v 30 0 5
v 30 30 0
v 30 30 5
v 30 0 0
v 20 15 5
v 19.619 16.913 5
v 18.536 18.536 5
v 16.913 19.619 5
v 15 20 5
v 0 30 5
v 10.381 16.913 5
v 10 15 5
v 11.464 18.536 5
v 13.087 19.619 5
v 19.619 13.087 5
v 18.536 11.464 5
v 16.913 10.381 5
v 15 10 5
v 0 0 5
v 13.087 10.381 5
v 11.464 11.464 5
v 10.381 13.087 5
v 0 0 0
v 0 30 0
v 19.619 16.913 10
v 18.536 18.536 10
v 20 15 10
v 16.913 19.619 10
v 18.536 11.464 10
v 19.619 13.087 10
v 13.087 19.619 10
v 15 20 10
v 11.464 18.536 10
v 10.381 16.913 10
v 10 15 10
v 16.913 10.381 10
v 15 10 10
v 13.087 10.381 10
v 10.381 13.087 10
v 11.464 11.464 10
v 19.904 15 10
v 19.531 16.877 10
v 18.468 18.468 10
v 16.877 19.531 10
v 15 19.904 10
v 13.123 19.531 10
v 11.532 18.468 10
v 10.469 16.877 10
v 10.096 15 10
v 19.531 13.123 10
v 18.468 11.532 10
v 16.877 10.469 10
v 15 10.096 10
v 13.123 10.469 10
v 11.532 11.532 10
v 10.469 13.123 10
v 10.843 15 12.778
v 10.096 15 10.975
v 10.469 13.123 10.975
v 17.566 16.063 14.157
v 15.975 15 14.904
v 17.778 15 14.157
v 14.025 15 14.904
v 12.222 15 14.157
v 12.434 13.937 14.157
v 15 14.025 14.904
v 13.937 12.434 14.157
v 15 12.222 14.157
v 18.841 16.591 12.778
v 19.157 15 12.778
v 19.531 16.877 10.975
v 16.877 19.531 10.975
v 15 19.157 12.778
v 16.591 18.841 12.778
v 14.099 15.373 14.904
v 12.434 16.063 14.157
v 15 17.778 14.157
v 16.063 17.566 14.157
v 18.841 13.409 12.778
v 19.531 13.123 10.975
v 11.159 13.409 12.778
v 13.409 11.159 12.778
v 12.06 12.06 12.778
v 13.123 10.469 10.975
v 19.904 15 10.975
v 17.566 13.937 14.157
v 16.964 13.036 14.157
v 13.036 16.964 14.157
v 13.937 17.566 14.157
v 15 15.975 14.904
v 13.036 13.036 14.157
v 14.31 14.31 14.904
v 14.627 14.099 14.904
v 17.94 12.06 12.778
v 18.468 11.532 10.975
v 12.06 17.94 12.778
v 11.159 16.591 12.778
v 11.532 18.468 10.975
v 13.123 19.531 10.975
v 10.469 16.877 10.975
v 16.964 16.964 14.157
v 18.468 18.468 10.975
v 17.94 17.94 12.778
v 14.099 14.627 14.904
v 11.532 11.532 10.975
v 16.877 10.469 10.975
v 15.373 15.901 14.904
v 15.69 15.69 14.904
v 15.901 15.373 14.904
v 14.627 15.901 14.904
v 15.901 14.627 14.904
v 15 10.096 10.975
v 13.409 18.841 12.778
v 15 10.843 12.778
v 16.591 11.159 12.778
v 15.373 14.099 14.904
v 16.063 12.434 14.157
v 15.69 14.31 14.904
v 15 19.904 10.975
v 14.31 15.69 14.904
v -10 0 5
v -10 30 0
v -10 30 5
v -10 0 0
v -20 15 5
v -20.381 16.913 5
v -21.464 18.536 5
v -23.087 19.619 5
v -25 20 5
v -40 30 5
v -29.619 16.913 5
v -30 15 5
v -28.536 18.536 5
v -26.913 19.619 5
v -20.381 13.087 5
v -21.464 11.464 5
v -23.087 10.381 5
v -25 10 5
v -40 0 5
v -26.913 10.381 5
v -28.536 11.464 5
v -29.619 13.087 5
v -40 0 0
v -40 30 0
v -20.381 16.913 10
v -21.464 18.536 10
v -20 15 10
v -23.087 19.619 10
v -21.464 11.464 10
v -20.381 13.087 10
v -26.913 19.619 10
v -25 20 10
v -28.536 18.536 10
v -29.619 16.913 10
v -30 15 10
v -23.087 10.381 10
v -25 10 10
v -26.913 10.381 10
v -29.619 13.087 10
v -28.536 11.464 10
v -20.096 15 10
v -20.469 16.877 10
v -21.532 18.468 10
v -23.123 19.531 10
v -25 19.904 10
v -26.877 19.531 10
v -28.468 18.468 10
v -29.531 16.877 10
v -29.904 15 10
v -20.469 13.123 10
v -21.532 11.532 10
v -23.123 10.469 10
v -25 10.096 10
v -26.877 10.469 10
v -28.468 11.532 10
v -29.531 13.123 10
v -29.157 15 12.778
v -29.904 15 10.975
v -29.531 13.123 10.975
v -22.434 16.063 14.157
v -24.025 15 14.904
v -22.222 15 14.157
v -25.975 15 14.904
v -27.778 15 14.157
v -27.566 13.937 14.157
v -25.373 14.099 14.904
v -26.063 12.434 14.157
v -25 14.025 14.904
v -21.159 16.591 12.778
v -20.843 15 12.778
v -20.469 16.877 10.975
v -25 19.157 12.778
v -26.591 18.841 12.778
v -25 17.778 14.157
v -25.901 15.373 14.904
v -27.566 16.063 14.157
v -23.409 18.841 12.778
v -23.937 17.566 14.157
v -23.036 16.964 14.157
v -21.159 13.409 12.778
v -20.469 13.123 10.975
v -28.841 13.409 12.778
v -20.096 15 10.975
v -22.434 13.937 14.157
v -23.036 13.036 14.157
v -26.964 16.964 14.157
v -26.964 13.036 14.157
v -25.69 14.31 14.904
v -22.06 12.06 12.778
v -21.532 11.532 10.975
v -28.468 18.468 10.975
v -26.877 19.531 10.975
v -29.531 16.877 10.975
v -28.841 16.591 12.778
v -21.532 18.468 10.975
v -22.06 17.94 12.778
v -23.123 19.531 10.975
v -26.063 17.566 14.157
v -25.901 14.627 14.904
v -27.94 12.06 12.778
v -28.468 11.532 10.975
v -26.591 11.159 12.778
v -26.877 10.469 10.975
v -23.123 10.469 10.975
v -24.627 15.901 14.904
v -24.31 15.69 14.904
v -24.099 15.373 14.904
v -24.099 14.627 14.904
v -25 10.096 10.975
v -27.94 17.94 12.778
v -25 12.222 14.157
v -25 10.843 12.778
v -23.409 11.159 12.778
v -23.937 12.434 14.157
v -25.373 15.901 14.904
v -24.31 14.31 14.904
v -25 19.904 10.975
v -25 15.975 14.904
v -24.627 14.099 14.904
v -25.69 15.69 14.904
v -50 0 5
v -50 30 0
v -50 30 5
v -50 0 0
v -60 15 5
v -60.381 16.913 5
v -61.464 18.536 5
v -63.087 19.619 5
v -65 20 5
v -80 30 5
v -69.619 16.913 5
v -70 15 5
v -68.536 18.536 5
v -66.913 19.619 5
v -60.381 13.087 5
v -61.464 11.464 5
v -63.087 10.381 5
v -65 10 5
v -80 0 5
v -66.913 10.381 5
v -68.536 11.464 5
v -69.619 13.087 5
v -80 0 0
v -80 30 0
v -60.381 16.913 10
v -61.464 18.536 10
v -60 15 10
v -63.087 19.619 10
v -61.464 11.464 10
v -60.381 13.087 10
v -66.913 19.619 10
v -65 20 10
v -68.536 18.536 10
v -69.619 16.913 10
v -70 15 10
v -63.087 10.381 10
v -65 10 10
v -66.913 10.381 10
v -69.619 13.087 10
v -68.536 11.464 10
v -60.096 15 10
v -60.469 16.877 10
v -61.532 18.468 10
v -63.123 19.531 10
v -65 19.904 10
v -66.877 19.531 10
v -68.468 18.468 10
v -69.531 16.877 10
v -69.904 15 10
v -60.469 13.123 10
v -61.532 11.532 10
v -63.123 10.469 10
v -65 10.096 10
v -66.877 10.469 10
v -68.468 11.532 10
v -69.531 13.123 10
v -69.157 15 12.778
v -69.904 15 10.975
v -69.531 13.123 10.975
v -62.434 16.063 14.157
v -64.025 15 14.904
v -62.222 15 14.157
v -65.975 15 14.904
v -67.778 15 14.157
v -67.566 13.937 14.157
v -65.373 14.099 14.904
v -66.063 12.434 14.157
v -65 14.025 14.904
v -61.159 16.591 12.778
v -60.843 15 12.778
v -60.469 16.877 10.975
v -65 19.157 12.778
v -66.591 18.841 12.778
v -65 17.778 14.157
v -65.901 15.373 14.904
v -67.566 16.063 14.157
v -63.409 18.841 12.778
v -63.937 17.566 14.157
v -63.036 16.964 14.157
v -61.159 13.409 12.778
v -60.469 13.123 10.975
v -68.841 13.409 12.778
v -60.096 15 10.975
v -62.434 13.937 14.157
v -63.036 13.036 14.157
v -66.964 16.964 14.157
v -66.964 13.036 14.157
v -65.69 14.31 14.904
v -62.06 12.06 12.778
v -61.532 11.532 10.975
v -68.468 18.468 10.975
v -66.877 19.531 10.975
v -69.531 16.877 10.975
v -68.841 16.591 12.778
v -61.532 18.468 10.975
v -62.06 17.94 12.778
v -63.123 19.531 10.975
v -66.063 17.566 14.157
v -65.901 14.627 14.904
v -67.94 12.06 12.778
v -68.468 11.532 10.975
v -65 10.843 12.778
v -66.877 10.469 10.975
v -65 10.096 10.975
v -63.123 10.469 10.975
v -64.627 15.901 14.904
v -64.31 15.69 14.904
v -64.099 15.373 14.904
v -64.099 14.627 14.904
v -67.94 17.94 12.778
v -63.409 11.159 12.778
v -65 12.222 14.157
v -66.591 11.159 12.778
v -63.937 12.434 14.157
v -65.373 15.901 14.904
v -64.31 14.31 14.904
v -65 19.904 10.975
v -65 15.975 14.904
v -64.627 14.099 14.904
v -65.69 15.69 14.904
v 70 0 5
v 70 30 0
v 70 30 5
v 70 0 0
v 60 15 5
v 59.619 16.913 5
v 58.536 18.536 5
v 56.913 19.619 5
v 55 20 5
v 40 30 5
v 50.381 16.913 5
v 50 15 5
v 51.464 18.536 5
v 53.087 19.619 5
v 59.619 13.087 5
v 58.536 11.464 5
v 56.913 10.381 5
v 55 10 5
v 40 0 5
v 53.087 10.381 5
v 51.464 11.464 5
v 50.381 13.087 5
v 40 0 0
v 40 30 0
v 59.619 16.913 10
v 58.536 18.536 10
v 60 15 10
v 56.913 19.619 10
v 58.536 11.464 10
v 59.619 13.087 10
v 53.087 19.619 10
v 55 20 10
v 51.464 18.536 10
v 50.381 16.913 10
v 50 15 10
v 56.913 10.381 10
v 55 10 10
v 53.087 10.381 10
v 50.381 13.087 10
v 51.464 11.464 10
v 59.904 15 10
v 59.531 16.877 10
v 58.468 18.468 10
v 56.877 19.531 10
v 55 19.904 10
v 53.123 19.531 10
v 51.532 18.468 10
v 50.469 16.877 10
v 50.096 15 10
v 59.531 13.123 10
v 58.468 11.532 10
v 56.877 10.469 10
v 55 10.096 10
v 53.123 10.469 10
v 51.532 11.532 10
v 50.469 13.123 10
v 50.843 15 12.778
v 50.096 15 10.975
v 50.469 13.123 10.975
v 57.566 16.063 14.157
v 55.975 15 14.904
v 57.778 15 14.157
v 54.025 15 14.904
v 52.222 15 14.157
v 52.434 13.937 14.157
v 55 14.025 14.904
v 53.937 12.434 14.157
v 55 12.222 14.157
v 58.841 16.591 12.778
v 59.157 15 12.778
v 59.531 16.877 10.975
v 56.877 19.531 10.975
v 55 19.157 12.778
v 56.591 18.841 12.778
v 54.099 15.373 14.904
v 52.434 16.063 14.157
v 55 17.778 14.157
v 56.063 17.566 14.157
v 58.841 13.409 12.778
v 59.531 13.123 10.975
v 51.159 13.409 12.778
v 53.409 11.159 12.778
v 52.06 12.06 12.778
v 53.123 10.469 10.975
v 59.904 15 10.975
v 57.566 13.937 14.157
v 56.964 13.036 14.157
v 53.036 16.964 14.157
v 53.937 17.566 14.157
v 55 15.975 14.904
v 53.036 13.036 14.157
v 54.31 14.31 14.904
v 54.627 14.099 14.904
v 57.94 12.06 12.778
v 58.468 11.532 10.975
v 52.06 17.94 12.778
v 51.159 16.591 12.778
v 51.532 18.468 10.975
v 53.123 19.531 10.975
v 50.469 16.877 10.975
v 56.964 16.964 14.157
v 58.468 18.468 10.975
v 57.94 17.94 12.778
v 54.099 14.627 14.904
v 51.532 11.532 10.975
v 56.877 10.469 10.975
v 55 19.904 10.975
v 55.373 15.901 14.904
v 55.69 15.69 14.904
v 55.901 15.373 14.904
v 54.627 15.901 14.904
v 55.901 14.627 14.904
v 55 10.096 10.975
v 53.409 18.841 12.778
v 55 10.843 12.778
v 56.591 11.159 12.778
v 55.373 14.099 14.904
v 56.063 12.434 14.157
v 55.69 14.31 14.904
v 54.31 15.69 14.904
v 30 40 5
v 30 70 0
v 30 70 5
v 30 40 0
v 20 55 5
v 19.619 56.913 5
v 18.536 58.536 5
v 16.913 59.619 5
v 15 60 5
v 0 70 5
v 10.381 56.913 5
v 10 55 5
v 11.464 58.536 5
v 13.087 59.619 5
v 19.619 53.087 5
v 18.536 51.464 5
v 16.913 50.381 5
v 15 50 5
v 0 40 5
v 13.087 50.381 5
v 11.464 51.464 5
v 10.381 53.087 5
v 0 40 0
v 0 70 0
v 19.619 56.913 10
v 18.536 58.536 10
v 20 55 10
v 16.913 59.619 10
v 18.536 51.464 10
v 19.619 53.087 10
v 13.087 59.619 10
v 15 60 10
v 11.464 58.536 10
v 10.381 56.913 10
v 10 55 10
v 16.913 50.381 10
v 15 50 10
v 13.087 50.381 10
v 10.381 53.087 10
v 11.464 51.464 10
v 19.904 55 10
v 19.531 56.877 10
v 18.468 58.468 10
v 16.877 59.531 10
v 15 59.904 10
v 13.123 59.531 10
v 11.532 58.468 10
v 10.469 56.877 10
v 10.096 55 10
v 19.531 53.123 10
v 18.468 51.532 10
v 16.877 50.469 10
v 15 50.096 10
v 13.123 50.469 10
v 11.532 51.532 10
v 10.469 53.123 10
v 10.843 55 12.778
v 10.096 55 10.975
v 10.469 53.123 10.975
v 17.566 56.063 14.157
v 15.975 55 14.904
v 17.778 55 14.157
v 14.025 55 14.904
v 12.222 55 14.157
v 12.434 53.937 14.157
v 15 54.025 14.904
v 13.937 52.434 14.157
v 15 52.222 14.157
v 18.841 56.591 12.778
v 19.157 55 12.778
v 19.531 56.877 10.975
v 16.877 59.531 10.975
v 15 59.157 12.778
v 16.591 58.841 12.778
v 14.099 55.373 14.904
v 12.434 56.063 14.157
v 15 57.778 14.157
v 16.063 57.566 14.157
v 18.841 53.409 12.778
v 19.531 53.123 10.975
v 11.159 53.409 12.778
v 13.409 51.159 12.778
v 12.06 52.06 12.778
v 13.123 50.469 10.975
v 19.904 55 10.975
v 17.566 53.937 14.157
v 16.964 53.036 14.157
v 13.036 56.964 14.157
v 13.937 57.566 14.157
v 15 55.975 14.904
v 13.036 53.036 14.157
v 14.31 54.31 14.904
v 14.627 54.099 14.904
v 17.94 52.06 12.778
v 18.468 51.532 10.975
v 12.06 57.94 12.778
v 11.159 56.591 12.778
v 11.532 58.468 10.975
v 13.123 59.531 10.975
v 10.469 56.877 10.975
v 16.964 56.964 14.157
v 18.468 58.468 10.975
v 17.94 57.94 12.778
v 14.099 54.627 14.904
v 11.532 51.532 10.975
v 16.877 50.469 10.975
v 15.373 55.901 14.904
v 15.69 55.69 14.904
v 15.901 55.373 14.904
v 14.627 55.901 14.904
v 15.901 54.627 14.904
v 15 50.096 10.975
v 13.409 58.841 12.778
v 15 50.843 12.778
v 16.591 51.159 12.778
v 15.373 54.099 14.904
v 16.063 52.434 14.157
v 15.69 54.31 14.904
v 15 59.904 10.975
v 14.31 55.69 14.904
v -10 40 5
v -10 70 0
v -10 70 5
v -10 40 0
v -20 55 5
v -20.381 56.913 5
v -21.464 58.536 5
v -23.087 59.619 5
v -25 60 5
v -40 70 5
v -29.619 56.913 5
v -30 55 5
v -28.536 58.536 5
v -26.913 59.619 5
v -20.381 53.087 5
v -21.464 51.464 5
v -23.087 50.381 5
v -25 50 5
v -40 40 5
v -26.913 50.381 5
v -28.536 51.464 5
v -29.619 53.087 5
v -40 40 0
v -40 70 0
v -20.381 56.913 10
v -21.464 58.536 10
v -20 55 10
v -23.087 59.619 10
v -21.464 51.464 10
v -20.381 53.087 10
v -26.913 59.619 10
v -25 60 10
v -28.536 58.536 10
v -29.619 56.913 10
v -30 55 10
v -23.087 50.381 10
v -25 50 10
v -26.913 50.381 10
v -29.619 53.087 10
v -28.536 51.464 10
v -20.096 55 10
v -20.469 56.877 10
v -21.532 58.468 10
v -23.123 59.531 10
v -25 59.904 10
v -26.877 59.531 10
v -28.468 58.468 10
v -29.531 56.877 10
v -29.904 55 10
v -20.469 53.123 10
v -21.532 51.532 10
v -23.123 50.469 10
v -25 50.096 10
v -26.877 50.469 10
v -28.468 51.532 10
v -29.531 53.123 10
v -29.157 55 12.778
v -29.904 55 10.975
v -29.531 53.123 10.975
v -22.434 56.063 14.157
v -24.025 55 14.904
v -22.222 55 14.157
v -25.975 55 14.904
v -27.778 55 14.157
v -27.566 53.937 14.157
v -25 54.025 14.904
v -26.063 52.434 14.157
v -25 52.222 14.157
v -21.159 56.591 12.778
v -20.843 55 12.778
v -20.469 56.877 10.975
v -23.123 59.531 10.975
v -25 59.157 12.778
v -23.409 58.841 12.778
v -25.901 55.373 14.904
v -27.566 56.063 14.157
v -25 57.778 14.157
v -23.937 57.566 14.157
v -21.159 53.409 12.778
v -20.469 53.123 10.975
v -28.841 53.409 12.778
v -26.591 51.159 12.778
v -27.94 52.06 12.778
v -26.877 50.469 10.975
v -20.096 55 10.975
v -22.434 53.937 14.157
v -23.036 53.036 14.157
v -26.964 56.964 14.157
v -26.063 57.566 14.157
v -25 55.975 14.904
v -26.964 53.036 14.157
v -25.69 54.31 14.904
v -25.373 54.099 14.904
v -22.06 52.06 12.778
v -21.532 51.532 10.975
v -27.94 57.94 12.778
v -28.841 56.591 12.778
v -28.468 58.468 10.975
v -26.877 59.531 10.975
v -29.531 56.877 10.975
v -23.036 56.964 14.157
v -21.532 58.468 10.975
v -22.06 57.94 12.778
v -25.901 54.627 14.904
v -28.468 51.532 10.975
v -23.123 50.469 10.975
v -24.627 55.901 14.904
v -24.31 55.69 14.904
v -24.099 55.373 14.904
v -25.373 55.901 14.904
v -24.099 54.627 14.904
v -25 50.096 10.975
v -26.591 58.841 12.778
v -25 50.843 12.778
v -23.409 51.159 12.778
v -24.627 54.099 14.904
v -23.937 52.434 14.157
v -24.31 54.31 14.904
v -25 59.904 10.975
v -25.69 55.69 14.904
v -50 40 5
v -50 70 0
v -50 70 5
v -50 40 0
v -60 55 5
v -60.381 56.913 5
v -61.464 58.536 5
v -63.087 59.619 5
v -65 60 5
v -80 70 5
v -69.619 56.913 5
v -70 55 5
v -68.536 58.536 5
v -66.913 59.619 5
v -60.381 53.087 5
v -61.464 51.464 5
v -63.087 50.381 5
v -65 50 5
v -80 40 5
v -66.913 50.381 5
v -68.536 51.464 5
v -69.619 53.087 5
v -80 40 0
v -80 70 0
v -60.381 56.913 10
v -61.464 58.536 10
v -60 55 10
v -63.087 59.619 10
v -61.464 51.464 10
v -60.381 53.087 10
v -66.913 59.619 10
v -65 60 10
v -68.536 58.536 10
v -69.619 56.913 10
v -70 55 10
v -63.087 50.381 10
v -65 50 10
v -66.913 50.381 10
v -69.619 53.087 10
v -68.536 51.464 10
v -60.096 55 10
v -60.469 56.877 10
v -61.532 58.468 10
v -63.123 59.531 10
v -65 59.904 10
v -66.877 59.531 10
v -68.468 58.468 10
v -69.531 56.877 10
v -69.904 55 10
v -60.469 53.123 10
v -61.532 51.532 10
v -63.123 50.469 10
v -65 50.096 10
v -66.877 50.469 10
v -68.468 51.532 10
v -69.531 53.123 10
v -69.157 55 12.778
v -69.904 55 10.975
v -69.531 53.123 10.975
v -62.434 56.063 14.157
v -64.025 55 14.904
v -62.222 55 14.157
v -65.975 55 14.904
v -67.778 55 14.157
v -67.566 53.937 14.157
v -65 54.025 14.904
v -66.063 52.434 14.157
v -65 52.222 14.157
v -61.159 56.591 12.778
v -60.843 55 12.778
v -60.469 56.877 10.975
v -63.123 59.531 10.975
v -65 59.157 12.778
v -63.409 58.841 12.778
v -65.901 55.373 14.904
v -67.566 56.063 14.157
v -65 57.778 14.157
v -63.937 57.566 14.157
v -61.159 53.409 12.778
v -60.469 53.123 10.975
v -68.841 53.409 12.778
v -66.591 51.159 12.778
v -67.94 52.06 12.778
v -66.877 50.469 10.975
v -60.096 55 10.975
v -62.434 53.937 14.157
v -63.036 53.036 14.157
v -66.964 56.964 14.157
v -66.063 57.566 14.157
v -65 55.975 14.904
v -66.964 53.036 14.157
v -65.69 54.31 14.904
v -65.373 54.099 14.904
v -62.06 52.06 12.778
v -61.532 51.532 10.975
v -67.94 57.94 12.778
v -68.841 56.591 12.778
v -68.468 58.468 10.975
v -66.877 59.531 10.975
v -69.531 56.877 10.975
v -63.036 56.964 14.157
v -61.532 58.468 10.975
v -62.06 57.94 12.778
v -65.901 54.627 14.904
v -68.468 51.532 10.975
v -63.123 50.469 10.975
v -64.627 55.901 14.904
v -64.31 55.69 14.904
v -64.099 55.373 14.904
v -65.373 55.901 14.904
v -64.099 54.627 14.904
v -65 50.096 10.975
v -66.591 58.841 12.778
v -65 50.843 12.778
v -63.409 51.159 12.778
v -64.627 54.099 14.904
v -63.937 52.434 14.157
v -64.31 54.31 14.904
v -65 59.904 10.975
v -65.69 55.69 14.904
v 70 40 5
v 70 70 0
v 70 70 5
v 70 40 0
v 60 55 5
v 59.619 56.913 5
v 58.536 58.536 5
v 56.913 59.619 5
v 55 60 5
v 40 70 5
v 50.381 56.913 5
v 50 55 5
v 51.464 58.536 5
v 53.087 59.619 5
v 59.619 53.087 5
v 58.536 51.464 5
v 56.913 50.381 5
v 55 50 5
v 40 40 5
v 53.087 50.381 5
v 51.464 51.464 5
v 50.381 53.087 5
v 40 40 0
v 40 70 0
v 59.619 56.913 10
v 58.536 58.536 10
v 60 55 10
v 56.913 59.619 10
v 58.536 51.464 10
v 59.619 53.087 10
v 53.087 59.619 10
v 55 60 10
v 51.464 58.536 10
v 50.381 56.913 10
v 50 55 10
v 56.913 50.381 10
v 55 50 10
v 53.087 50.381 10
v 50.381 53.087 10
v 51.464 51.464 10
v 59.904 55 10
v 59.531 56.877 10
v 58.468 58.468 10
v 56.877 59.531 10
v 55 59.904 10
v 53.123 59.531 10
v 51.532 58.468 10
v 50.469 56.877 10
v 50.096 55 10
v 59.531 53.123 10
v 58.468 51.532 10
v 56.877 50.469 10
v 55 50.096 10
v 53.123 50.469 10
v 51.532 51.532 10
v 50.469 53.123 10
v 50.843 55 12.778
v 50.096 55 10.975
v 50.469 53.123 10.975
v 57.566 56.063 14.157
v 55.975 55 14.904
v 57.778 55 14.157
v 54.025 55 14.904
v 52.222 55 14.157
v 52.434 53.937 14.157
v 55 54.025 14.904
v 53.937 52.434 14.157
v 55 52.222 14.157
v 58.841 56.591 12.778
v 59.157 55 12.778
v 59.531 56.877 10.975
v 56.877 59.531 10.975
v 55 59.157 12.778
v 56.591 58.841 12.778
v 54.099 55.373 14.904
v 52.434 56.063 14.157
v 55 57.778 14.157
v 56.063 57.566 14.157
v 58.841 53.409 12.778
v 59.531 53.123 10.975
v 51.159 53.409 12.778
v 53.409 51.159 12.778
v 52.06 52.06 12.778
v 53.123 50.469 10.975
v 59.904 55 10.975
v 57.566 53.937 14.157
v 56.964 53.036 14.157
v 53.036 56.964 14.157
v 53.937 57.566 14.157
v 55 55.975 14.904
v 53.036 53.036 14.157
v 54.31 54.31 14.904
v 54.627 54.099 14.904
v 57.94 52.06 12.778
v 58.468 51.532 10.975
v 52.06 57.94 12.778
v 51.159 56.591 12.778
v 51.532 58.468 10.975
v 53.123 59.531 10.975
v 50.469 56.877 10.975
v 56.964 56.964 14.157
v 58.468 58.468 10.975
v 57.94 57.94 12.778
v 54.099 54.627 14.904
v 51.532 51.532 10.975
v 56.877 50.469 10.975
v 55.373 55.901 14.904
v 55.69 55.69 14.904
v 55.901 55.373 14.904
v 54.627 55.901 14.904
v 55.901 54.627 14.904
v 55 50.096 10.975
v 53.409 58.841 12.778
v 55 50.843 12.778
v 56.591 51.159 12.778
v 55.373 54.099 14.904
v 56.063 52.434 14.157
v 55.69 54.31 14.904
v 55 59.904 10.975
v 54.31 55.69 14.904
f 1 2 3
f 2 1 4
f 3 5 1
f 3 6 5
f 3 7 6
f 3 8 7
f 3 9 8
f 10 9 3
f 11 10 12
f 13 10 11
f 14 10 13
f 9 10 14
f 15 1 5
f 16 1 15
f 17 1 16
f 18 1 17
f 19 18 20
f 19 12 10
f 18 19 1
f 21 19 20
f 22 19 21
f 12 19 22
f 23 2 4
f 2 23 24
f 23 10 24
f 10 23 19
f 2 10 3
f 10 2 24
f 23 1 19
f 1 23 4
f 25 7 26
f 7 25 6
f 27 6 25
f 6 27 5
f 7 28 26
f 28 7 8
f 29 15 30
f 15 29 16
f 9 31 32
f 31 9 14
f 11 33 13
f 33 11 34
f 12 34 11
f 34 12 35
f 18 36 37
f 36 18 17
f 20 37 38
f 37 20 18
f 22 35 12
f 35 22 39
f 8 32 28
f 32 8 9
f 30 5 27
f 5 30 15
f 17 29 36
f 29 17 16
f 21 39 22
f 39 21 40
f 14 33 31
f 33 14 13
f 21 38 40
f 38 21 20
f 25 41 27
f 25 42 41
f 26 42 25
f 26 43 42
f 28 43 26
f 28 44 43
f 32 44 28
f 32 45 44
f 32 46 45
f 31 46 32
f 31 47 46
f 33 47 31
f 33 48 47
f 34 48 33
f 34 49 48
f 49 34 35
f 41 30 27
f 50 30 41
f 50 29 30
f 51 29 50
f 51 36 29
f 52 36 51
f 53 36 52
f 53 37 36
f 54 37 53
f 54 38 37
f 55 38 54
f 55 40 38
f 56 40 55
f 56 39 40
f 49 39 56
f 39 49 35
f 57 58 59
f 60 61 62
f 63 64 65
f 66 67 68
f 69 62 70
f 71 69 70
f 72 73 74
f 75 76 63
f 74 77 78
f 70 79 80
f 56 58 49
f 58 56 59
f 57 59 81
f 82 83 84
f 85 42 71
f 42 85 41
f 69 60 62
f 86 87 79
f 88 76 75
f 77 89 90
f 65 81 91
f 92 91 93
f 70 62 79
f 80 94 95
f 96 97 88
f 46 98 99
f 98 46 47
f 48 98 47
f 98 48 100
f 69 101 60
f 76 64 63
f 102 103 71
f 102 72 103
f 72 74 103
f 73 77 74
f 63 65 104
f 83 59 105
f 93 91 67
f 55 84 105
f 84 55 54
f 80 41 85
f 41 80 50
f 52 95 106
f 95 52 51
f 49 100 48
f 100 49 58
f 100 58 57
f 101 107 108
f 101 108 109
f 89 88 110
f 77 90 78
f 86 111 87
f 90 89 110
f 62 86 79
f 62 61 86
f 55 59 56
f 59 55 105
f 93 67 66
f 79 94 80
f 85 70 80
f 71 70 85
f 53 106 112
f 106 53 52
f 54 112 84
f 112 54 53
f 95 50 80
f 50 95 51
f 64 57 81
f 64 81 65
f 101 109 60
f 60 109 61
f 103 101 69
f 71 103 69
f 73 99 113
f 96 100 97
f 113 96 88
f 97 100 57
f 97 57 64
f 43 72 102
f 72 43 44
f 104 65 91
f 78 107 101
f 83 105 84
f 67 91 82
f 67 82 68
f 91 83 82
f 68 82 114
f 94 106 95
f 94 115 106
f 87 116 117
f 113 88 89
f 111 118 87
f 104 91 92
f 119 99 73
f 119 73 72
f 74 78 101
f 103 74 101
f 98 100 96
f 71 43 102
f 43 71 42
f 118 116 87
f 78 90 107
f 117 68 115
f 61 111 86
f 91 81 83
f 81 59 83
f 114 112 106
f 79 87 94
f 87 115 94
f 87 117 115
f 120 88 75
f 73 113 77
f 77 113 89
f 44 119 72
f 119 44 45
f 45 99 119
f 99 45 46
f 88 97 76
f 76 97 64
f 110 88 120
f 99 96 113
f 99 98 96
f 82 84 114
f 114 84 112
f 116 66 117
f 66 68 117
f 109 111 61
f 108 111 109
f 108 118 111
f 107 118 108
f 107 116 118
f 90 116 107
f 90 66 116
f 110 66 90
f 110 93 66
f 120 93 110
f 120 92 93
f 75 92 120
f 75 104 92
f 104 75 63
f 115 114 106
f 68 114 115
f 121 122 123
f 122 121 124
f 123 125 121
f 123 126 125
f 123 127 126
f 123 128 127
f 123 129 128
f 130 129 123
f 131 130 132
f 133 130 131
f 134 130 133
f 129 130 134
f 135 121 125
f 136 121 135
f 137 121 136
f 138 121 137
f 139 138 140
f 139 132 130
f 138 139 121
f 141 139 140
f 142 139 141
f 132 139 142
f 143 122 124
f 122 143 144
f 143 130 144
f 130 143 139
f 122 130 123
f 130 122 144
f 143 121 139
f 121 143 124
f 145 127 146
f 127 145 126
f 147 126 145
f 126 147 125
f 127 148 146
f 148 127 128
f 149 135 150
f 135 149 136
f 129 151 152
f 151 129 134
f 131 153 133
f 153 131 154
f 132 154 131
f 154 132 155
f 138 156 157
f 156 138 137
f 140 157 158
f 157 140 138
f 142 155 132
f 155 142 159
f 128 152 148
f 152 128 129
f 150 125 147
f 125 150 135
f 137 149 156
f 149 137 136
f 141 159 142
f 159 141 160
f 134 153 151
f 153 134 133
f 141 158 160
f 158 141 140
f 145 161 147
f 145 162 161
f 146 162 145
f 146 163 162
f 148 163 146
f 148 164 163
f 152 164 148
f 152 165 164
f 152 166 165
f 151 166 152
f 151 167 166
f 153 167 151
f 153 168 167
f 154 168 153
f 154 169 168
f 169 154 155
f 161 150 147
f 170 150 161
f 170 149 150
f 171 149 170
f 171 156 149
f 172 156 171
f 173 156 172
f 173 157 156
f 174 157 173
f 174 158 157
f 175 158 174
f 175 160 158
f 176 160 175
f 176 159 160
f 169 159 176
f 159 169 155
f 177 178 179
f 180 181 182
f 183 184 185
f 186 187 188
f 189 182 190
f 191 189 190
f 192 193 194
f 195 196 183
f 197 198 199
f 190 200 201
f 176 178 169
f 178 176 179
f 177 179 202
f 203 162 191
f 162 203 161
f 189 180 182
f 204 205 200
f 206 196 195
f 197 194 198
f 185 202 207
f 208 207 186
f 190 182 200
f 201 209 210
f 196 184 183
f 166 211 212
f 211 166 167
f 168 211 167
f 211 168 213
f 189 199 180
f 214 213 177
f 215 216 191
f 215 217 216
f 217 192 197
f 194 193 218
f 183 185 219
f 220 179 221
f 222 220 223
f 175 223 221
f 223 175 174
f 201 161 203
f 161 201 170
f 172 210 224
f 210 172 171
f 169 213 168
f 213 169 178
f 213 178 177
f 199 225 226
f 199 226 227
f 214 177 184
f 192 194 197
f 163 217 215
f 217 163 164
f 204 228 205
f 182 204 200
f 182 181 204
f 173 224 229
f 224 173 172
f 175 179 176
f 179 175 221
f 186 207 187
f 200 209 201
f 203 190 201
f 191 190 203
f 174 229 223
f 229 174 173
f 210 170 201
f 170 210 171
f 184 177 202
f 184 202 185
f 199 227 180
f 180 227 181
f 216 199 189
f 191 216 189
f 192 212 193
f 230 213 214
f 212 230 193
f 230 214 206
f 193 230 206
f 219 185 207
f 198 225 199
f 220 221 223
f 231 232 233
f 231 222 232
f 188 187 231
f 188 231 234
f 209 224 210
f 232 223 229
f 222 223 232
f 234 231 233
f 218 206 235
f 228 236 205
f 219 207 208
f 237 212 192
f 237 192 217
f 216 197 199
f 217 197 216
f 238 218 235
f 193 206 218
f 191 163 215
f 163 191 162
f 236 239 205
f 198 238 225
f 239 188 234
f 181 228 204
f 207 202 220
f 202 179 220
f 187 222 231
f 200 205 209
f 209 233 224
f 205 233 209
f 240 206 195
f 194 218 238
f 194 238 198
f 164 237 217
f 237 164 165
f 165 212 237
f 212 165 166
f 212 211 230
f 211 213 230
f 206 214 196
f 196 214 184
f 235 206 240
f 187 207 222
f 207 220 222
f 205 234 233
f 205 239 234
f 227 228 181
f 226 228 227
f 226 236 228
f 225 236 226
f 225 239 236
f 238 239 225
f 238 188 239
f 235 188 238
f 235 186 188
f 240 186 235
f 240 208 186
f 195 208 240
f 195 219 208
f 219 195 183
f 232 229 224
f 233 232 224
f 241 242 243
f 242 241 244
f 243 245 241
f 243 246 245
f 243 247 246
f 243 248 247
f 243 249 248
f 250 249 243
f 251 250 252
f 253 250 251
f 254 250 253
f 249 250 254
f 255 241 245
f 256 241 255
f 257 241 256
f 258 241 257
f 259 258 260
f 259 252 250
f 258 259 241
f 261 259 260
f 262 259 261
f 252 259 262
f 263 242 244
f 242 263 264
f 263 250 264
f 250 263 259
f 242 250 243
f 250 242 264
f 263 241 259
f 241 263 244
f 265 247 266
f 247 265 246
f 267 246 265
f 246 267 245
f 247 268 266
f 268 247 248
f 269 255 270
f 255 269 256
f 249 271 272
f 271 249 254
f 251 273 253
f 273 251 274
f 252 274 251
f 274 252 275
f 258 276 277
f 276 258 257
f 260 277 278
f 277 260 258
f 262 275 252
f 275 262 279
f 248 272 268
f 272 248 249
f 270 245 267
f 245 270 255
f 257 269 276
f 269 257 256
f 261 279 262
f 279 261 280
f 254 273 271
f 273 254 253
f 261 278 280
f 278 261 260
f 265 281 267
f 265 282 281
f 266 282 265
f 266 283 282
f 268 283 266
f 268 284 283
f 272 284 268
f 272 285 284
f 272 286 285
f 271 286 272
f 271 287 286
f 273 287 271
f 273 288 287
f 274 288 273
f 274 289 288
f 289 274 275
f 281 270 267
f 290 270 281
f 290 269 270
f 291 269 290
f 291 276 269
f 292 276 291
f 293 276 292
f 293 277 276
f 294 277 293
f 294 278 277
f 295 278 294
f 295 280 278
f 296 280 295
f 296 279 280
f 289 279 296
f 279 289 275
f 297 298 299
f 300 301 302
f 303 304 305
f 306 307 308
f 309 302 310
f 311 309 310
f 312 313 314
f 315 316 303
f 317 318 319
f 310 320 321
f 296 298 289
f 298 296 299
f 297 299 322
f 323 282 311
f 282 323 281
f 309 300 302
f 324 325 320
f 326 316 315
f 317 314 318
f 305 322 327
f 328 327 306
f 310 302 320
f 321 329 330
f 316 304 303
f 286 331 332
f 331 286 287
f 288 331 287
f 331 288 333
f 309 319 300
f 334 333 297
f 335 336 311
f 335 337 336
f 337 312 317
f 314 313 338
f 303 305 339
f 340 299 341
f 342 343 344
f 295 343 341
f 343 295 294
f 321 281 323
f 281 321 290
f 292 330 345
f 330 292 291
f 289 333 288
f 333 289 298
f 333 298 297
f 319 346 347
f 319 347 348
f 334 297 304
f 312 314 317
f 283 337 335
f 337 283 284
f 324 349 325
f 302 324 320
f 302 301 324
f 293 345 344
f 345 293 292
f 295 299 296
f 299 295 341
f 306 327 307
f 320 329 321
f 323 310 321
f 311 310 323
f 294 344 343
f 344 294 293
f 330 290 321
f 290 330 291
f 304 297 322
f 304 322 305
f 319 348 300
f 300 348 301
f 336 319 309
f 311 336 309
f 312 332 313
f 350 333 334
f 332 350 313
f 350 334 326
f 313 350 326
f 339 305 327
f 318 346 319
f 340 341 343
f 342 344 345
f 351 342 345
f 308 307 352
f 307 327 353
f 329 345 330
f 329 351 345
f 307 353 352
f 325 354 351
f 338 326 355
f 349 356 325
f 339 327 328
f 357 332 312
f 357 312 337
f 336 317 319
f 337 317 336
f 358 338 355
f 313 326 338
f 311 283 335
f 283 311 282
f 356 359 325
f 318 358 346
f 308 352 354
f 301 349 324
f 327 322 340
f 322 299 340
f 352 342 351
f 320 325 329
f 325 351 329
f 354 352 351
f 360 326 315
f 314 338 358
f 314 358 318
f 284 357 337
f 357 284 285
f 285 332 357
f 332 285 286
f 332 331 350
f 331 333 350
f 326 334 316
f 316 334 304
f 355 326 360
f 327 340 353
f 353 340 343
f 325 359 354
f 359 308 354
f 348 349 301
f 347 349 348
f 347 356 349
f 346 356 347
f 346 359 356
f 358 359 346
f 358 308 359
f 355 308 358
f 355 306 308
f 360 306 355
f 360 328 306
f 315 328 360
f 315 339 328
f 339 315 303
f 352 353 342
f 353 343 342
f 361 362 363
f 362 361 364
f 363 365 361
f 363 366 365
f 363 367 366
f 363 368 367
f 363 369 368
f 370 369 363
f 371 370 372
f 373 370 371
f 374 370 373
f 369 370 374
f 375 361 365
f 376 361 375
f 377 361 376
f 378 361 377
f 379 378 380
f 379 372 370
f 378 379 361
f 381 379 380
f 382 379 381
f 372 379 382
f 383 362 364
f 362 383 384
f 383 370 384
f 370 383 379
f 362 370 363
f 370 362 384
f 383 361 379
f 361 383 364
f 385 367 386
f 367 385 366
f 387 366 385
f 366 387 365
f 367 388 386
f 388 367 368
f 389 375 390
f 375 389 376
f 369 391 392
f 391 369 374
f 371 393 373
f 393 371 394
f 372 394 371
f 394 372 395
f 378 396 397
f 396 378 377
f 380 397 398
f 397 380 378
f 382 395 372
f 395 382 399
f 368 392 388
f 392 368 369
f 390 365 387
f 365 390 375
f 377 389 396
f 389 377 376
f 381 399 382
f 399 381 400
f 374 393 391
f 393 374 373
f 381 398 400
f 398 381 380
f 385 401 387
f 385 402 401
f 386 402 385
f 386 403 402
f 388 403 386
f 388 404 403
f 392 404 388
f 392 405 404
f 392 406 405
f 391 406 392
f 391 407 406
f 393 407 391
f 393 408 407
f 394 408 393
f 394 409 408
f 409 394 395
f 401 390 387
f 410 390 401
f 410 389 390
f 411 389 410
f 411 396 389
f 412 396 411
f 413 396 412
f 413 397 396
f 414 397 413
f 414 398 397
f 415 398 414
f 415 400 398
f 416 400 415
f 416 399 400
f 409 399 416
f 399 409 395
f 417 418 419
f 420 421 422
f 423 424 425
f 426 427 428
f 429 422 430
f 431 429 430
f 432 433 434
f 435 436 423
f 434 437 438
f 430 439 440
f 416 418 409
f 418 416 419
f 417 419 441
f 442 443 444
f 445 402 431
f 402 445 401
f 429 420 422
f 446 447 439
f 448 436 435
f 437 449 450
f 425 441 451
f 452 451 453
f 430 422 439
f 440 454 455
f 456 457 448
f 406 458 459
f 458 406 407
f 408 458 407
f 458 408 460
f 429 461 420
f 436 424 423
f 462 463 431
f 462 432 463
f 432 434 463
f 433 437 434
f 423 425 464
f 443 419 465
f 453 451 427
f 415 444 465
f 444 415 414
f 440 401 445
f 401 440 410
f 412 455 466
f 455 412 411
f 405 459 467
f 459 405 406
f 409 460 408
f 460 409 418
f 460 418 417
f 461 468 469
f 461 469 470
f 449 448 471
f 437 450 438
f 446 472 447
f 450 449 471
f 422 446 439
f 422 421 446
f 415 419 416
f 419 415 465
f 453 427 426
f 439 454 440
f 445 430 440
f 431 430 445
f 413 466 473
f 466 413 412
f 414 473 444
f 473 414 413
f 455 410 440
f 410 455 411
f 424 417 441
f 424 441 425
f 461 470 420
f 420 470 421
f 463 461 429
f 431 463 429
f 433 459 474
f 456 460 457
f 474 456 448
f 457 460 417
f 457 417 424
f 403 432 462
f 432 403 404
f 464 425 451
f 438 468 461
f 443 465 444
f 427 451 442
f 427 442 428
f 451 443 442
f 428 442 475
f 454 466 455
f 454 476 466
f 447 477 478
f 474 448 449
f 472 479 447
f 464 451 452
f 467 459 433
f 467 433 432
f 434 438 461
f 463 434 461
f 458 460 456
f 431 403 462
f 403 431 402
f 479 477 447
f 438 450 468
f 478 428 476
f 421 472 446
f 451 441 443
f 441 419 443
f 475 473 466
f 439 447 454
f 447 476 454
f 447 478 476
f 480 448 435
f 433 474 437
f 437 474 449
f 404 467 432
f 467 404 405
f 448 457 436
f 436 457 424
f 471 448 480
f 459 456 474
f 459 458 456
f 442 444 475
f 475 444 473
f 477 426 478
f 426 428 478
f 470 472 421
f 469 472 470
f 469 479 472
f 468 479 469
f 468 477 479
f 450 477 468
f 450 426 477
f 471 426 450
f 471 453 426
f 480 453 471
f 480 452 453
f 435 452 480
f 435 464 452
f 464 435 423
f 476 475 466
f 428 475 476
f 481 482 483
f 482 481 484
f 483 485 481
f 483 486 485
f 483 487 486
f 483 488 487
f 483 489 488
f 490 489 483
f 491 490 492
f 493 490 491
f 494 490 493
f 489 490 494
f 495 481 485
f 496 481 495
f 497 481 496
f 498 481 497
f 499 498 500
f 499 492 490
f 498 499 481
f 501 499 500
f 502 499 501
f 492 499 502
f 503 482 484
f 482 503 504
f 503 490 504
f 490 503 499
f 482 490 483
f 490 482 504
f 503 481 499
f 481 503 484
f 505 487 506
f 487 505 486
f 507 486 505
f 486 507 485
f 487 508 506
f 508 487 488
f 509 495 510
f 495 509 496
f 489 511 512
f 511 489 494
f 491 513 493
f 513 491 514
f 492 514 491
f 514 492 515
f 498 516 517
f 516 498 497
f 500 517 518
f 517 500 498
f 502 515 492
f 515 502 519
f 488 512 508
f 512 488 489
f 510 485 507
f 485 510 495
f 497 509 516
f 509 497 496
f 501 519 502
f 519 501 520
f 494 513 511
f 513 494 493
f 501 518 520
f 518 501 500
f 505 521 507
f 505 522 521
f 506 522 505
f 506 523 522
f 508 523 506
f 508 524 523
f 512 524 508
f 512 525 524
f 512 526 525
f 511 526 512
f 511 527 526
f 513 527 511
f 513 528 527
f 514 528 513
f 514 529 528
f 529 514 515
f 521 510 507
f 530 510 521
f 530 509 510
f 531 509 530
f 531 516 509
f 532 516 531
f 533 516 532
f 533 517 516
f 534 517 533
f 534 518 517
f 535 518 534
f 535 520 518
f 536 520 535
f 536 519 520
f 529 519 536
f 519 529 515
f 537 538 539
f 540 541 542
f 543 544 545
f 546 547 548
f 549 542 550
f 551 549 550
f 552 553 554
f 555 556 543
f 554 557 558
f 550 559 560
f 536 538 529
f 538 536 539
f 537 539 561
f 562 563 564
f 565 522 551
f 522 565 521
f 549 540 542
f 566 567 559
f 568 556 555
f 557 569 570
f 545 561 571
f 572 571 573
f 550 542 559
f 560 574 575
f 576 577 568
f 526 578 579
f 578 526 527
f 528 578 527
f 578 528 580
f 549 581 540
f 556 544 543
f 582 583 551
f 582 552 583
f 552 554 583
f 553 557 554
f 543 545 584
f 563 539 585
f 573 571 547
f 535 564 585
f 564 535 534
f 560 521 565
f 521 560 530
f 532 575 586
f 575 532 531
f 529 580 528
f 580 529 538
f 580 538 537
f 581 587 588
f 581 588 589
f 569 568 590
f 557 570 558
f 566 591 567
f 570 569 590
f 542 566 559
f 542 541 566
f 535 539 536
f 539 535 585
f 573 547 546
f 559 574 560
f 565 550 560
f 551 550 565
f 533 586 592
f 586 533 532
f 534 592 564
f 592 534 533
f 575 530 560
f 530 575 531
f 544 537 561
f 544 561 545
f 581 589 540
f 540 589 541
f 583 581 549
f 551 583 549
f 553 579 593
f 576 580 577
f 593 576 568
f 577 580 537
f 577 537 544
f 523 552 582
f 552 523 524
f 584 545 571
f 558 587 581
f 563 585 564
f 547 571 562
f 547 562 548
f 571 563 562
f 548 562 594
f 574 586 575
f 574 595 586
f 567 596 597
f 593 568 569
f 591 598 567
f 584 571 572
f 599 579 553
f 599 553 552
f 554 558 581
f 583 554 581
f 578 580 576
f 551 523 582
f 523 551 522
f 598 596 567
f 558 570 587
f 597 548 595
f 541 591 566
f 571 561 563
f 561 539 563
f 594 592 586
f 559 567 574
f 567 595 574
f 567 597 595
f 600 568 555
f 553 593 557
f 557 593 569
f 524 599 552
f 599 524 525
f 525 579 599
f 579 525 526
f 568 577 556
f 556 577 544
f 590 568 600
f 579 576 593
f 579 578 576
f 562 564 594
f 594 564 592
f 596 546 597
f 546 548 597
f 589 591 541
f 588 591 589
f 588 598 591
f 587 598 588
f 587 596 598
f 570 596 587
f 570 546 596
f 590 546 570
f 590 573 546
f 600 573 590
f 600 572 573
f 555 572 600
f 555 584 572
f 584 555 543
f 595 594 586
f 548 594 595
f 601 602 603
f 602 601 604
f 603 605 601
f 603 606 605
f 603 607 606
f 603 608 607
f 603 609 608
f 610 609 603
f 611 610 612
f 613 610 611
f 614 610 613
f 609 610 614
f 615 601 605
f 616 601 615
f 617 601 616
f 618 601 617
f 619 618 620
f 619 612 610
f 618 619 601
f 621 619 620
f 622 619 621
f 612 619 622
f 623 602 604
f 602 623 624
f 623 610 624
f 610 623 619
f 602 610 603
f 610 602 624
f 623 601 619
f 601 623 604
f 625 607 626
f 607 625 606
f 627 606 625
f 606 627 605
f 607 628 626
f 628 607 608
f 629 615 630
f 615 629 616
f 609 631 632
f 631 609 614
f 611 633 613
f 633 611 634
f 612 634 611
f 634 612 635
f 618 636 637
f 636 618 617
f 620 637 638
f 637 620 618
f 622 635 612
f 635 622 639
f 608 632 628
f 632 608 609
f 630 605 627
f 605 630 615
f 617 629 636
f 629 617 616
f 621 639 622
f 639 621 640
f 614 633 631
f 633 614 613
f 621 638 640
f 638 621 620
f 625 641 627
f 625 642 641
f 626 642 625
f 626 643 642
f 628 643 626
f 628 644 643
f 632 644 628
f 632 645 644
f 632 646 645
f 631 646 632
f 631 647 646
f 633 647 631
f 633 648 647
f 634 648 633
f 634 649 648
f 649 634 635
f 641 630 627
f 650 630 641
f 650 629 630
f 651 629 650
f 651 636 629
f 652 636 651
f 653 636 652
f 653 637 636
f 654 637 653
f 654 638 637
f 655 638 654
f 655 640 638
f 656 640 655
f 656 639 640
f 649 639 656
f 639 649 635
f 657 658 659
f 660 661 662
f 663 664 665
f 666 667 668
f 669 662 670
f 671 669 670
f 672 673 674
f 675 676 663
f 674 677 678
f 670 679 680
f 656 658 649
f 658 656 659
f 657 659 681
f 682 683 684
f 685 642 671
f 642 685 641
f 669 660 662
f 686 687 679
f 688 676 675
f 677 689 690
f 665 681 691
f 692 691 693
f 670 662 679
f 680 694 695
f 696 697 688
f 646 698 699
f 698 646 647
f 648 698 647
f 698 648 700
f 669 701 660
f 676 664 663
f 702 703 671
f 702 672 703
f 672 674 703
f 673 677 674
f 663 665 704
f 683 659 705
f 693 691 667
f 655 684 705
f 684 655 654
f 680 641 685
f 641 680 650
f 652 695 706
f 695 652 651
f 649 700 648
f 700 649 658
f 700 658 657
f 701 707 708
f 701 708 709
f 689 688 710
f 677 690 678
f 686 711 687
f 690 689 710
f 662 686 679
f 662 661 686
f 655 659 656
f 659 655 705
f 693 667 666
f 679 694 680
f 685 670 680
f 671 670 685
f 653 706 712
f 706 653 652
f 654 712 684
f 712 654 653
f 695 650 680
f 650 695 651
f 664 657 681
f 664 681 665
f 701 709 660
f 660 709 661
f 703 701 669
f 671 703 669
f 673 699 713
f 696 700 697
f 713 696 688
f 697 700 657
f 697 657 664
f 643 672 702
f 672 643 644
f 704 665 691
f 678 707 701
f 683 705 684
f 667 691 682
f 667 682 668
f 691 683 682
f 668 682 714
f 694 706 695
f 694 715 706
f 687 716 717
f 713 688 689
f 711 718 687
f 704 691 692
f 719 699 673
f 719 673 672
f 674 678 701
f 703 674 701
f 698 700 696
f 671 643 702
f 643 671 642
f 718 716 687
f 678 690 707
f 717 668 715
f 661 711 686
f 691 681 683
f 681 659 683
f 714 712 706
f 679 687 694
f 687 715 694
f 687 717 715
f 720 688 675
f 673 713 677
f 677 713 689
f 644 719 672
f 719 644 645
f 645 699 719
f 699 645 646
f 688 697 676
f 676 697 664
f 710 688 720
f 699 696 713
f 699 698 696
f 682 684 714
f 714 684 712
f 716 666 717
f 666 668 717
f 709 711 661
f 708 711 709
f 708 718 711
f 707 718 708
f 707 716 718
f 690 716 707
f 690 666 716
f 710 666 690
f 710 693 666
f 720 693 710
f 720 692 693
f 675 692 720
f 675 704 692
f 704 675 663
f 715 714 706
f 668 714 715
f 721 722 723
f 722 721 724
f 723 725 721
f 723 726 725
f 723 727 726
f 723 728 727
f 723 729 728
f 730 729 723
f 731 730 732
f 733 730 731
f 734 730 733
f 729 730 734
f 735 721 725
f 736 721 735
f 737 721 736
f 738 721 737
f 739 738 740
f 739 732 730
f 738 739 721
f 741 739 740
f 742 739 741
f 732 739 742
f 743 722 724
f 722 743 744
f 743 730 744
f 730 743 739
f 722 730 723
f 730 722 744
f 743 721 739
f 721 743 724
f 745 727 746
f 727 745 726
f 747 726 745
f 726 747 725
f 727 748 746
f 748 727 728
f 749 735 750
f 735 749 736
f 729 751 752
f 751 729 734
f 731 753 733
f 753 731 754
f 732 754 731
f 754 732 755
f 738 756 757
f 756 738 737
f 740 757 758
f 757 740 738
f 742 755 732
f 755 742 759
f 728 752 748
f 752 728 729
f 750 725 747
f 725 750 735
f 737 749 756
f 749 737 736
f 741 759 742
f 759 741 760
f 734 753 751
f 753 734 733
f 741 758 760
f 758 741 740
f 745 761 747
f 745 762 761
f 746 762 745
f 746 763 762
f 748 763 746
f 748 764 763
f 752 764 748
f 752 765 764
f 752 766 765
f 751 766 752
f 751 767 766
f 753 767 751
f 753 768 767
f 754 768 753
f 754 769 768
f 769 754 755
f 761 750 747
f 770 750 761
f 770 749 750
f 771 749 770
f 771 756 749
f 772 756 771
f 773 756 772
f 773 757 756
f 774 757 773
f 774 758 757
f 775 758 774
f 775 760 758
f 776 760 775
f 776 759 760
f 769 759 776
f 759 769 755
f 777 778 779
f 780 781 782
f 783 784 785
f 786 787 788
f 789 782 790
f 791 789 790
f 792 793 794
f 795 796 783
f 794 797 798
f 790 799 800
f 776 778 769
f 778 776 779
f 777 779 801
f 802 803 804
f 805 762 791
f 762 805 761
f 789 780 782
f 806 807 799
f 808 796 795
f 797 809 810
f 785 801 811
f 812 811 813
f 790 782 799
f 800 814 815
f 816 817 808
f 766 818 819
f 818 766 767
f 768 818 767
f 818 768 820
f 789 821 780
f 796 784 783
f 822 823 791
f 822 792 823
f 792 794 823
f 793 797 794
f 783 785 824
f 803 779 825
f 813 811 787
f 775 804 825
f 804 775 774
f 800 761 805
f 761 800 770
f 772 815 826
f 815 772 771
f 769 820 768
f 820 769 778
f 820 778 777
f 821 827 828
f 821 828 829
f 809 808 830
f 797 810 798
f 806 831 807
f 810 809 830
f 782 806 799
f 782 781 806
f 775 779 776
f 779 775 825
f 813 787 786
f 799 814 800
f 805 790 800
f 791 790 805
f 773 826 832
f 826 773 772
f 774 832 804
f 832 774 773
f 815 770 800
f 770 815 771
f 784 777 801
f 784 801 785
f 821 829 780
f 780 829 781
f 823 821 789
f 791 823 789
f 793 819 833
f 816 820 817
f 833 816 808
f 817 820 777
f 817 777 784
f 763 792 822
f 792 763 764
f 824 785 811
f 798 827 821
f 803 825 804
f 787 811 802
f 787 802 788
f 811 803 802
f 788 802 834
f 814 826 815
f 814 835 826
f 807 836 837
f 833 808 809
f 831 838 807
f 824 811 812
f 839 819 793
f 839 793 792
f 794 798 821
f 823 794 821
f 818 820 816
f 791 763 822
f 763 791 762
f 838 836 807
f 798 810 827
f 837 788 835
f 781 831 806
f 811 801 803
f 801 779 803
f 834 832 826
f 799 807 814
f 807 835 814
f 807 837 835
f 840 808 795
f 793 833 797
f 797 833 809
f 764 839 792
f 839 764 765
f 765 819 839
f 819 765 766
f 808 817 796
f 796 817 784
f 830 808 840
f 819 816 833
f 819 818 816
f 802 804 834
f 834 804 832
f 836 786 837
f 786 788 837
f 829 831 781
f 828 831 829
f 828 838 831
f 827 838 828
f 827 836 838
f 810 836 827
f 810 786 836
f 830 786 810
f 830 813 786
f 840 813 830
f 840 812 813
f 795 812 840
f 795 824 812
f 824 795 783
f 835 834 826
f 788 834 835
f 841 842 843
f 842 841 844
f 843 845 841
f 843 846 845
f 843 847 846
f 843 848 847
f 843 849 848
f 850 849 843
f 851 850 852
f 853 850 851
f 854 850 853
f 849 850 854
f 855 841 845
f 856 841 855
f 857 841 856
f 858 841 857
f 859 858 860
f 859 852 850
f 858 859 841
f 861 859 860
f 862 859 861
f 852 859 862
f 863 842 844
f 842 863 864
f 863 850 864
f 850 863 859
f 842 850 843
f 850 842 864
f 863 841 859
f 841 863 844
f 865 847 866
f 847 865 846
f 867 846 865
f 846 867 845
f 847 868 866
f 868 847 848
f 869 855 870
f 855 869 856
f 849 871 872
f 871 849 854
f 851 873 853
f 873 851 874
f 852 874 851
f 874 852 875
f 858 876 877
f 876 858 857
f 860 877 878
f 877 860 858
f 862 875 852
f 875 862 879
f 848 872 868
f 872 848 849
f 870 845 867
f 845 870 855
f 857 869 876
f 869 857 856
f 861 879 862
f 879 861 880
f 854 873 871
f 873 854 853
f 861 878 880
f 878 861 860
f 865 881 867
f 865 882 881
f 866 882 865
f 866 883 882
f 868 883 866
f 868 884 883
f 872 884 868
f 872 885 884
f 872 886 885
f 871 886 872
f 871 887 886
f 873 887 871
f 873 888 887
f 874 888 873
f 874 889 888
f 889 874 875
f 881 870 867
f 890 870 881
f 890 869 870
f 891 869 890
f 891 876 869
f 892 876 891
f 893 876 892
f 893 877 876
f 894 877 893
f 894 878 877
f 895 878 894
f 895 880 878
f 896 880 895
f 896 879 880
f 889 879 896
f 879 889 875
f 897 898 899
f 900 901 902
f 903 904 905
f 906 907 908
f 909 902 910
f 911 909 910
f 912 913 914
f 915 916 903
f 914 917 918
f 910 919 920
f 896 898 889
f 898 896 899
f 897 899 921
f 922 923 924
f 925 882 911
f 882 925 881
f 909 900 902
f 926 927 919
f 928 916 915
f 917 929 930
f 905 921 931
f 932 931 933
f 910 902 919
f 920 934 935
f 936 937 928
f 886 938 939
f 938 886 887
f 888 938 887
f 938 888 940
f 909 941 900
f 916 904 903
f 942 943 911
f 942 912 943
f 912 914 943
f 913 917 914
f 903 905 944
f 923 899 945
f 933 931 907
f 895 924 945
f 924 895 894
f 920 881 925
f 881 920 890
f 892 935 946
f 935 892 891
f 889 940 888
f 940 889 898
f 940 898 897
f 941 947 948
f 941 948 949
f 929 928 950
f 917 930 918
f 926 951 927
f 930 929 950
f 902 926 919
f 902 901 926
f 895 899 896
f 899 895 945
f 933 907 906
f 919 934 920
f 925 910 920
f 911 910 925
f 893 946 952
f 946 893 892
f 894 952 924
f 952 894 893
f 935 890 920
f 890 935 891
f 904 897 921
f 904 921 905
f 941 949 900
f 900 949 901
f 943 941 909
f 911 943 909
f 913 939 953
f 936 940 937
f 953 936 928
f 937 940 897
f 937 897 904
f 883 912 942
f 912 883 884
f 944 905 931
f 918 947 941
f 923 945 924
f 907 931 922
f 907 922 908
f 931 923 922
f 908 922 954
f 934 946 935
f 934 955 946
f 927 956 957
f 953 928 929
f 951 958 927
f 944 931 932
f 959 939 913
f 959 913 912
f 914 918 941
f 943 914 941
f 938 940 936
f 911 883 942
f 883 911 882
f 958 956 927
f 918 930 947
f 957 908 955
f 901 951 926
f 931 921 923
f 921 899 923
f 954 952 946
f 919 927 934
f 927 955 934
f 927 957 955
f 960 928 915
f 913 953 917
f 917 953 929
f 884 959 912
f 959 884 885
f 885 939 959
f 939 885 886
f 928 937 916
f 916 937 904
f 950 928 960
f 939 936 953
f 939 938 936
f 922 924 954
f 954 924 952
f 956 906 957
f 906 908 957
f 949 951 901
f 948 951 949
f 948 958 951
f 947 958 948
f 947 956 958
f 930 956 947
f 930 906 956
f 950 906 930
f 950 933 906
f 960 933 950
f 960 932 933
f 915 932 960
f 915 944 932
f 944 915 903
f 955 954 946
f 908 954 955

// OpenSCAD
module holder(x = 0, y = 0) {
    translate([x,y,0]) {
        cube([30,30,5]);
        translate([15,15,5]) cylinder(r=5, h=5);
        translate([15,15,10]) sphere(r=5);
    }
}

holder(0,0);
holder(-40,0);
holder(-80,0);
holder(40,0);

holder(0,40);
holder(-40,40);
holder(-80,40);
holder(40,40);
